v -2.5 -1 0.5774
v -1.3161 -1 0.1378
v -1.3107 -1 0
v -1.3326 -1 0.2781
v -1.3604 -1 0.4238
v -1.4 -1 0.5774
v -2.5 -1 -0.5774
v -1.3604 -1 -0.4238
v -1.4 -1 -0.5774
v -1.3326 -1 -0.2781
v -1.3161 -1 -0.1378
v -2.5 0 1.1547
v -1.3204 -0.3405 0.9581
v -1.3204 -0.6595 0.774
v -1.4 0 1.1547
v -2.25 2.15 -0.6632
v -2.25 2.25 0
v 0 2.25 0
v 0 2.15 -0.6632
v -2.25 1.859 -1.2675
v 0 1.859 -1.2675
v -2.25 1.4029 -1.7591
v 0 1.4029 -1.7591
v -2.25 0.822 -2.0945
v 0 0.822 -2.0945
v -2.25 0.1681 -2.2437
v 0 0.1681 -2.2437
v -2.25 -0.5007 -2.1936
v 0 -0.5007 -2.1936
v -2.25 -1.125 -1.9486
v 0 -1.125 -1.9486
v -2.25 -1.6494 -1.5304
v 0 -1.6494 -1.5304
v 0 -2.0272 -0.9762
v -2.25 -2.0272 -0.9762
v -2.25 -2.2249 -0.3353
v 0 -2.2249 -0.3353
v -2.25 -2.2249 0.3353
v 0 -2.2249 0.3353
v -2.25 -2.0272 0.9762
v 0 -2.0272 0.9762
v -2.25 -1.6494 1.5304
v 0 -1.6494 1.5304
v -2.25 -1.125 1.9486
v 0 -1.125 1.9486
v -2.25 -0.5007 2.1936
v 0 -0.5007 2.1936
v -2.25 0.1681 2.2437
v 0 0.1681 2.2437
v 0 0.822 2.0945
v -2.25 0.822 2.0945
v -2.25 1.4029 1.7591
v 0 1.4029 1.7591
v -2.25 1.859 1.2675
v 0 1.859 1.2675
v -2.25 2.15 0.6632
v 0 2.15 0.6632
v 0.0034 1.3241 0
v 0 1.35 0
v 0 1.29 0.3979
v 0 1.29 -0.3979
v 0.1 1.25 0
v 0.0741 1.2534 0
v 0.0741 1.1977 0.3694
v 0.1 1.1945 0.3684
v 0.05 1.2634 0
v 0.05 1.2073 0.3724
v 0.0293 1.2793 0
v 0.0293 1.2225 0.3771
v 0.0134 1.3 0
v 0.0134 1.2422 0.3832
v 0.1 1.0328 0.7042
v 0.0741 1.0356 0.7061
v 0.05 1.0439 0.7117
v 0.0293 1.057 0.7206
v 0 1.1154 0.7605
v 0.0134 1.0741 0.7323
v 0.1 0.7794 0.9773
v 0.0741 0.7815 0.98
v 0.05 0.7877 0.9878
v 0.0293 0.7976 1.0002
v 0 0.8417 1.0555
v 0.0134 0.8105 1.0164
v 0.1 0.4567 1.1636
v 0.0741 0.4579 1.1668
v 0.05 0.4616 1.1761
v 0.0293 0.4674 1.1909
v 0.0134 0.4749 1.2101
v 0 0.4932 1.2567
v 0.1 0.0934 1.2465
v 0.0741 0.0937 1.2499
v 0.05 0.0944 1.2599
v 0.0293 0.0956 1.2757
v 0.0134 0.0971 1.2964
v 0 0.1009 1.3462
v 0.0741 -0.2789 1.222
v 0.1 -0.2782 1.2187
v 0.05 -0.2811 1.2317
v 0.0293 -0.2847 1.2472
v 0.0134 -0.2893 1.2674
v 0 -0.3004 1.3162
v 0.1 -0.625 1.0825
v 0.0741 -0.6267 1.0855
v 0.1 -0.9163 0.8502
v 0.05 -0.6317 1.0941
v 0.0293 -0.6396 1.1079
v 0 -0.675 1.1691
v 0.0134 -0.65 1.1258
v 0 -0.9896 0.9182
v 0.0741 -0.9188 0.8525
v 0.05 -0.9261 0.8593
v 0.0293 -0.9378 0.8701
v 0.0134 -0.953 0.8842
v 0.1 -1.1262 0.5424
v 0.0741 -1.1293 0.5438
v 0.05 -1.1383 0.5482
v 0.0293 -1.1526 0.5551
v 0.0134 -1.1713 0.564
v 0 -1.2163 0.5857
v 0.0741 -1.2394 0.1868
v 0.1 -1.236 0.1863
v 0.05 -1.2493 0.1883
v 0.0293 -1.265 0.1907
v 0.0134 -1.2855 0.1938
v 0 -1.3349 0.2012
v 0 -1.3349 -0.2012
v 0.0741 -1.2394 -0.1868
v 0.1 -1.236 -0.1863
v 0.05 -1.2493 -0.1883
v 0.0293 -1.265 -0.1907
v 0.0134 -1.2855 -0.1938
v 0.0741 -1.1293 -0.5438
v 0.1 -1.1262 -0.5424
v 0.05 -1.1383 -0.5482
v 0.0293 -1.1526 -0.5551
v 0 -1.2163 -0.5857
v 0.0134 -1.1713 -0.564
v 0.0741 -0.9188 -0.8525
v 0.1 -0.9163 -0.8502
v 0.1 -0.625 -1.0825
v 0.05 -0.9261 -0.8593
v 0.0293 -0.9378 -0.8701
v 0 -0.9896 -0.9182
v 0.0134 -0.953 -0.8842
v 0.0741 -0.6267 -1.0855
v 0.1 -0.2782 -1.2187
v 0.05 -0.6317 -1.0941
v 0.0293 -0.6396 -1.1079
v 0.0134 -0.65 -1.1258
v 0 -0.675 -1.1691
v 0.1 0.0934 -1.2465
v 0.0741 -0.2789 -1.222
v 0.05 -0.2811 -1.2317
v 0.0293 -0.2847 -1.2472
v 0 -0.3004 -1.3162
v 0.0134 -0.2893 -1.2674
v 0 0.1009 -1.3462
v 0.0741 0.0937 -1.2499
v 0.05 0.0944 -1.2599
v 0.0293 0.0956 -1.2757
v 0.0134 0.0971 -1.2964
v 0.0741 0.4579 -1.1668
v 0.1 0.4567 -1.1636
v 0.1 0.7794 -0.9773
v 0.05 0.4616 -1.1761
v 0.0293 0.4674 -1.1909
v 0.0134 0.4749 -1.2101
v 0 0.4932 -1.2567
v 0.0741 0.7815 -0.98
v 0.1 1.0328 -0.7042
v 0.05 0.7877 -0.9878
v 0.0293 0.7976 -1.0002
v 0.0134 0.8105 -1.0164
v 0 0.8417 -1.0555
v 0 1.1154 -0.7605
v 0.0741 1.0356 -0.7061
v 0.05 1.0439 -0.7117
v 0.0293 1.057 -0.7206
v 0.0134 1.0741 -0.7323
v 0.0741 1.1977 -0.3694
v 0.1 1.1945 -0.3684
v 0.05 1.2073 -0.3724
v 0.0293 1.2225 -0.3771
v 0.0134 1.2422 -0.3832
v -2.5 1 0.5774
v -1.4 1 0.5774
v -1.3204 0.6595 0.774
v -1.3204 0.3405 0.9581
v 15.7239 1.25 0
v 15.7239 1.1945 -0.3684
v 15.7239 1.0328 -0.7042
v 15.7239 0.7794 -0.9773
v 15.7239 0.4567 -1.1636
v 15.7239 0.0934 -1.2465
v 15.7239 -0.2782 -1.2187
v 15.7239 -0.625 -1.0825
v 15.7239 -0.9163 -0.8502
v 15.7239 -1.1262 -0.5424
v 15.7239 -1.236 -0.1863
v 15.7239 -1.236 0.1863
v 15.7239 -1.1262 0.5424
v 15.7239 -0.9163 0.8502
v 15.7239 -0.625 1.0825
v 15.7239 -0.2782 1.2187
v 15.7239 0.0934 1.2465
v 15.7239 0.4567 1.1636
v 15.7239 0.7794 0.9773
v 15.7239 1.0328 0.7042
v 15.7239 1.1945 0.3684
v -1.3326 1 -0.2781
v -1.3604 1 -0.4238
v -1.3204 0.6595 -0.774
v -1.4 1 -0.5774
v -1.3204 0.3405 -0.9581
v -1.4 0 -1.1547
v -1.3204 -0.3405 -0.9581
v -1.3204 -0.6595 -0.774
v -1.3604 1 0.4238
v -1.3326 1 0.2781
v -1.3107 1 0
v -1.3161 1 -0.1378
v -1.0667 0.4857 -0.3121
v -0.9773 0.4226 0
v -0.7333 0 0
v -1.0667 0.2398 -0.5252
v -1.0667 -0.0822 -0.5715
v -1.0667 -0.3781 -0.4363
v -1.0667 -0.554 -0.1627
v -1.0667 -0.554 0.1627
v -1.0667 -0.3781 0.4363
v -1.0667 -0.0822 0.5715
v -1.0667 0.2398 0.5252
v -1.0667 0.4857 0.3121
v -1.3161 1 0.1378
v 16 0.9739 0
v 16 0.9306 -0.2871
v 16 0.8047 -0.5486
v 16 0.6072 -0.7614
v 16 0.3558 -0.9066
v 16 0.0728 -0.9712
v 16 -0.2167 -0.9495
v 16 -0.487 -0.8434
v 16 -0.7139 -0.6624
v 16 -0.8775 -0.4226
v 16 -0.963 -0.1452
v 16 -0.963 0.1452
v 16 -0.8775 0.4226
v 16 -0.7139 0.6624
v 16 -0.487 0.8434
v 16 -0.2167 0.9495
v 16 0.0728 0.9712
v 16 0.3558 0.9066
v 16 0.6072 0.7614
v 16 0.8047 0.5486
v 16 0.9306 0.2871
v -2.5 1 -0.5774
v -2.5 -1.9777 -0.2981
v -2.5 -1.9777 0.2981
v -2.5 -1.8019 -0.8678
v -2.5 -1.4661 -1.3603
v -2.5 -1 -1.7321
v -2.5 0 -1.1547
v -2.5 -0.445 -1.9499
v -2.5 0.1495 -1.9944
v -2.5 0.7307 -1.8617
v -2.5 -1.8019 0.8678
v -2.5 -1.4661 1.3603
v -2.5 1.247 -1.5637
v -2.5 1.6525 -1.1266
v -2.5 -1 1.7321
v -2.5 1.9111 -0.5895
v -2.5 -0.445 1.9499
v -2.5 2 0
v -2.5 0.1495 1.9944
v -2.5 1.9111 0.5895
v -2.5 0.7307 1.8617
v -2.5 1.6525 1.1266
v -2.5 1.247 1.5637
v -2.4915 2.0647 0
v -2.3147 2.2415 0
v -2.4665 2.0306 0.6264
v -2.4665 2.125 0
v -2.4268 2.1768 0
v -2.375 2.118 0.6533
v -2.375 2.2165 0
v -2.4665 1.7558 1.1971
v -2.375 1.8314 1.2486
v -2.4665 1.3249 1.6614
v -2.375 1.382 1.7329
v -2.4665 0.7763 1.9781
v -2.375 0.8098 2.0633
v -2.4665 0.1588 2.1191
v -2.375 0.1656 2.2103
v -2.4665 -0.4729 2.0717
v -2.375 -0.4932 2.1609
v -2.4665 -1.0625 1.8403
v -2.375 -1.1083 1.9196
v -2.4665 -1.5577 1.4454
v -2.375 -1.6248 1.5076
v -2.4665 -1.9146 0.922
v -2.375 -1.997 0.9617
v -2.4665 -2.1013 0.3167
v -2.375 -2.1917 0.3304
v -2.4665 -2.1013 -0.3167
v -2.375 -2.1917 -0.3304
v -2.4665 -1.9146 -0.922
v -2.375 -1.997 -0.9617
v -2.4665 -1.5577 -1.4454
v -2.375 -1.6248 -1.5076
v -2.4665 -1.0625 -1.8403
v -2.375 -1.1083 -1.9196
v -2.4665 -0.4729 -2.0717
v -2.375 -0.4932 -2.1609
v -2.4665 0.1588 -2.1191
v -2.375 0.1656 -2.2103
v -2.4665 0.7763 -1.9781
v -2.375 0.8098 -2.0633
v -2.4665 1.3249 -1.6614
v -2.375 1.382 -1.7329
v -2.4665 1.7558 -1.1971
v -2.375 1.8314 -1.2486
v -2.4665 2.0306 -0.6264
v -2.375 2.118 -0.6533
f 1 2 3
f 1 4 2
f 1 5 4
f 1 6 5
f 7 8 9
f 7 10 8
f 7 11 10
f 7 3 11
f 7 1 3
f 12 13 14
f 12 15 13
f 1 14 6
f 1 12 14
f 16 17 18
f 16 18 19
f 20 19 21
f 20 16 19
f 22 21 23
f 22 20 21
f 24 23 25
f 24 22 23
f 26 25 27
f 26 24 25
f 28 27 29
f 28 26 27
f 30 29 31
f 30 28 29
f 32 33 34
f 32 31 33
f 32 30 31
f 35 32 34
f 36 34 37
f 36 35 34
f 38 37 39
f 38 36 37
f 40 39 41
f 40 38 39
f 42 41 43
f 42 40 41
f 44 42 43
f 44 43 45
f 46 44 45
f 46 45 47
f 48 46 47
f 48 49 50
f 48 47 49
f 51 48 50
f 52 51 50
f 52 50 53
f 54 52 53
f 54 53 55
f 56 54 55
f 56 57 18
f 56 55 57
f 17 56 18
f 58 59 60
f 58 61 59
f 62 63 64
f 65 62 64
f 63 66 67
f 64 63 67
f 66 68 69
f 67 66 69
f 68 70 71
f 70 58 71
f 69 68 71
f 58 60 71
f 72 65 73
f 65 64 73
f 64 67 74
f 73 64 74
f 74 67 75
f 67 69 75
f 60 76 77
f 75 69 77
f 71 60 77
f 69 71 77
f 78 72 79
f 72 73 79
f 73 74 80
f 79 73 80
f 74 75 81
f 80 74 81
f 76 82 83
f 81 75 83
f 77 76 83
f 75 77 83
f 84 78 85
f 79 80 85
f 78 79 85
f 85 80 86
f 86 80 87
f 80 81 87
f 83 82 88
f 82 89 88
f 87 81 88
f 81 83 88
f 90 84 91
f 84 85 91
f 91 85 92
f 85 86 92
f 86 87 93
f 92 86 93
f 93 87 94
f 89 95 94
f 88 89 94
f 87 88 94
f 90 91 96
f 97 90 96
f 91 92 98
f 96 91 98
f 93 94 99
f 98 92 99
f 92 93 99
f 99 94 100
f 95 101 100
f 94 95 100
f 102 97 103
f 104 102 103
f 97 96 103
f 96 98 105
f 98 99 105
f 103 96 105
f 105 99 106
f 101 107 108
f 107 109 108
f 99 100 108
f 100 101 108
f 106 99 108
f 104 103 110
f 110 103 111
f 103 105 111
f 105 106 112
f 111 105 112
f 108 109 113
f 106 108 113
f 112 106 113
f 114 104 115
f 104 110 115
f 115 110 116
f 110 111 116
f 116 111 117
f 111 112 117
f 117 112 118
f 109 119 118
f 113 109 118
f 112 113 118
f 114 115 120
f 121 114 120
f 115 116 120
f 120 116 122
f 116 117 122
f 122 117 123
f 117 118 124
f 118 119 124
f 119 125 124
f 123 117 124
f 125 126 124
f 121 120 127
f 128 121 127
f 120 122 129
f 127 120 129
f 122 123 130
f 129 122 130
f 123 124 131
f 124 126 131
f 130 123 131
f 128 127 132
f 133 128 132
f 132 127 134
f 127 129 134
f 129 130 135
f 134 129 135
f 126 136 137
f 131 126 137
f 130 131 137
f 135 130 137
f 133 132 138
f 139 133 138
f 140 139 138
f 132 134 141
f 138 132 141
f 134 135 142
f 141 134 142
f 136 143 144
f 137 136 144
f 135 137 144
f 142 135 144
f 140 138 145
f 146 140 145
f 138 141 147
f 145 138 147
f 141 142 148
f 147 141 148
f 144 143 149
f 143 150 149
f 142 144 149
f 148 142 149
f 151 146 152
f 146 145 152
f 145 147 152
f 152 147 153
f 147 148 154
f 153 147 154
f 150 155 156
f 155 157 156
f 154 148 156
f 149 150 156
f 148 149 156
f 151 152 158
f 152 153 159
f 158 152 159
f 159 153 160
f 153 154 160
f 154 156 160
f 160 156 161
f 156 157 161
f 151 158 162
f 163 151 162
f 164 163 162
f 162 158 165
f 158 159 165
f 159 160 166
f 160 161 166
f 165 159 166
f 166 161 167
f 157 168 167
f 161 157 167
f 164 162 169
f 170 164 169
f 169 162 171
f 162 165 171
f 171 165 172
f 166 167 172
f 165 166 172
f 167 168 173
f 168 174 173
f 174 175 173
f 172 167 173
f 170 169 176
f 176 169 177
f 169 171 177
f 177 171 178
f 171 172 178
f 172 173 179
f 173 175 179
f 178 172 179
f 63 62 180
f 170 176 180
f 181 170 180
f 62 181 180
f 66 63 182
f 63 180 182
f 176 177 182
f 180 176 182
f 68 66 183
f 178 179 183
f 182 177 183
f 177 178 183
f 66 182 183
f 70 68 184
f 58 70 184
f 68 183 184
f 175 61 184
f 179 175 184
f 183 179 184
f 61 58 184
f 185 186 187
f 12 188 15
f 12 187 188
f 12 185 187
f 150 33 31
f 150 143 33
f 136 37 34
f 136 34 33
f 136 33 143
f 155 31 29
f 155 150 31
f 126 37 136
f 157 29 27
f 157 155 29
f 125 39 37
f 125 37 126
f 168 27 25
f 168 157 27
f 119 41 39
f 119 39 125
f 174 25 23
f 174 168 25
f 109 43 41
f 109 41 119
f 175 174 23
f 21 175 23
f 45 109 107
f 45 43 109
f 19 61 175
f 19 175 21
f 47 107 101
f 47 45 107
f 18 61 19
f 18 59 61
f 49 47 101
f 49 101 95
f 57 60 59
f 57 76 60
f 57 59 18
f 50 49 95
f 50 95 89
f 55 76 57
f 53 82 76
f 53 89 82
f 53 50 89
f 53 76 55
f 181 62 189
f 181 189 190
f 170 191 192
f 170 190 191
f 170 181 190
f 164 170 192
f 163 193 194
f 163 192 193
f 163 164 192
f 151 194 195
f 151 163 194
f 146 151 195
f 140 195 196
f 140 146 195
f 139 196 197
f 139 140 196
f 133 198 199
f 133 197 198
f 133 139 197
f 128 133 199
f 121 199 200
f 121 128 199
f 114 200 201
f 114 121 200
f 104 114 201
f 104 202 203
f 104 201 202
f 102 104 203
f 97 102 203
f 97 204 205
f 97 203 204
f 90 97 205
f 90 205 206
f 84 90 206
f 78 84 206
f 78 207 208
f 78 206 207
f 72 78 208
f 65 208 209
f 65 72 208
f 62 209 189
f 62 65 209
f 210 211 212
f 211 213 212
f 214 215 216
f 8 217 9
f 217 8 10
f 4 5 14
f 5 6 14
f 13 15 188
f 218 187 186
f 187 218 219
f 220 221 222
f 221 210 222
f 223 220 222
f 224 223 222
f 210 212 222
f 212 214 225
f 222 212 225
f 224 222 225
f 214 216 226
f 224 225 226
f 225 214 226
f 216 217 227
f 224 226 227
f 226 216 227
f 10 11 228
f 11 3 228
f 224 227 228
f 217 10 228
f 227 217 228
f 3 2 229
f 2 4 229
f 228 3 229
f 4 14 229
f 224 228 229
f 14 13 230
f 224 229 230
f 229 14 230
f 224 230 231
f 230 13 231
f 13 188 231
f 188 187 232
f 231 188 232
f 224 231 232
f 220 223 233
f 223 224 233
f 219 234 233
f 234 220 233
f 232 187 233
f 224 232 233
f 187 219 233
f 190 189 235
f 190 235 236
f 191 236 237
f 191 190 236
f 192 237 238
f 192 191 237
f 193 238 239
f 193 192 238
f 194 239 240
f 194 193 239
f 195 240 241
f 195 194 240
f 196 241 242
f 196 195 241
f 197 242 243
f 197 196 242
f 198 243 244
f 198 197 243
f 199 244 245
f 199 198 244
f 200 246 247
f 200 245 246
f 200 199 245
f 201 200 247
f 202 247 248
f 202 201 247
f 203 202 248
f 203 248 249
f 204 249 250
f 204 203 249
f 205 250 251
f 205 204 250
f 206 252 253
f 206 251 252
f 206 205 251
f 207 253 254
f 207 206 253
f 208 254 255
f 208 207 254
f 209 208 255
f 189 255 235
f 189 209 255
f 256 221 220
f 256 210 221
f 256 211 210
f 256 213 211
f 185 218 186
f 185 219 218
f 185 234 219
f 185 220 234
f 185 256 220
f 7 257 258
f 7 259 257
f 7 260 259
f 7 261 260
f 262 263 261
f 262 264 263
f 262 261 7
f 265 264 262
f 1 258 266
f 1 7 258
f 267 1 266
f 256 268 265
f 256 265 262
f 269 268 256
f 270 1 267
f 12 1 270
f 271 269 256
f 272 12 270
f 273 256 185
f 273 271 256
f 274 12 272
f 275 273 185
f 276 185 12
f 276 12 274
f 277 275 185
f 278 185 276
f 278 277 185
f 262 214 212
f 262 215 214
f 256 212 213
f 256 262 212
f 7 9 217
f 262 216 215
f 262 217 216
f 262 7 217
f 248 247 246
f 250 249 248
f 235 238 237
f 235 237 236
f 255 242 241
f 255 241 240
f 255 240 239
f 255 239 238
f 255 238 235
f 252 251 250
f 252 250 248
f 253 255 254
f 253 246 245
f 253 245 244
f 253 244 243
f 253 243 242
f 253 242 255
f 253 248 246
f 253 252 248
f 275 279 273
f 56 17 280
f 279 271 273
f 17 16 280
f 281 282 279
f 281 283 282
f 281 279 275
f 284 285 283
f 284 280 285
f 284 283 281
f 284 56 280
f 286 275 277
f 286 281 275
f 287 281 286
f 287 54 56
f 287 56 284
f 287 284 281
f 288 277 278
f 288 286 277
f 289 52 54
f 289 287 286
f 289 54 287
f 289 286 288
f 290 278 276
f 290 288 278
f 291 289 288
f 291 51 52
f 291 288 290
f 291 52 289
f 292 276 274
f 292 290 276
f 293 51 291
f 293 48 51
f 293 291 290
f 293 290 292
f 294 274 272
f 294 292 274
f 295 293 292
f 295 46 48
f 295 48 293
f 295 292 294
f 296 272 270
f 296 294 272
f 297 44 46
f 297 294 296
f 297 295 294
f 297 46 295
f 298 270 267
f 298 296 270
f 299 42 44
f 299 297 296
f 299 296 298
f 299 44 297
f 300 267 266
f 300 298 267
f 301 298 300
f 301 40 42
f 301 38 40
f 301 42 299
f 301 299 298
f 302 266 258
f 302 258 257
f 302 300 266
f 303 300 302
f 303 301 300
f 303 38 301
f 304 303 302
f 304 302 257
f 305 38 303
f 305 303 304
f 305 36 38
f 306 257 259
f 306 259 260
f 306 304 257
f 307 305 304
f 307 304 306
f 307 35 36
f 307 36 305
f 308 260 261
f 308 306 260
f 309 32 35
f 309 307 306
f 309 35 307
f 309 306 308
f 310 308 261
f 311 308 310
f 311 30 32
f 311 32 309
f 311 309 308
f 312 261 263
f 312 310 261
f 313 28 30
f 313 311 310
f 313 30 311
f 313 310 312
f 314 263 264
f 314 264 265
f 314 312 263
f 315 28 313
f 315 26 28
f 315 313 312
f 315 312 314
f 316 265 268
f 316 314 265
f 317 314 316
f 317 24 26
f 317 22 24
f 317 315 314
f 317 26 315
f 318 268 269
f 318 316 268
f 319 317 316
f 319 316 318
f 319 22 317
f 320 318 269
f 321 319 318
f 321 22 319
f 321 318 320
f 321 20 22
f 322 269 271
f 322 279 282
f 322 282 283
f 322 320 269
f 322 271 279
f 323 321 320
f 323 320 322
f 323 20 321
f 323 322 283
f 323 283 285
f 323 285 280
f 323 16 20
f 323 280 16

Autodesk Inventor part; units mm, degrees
ref_plane "YZ Plane" through (0, 0, 0) normal (1, 0, 0) x (0, 1, 0)
ref_plane "XZ Plane" through (0, 0, 0) normal (0, 1, 0) x (-1, 0, 0)
sketch "Эскиз1" plane through (0, 0, 0) normal (0, 0, 1) x (1, 0, 0)
  line L0 (-0.7333, 0) -> (16, 0)
  line L1 (16, 0) -> (16, 1.25)
  line L2 (16, 1.25) -> (1.35, 1.25)
  line L3 (1.35, 1.25) -> (1.0738, 1.25)
  line L4 (1.0738, 1.25) -> (0, 1.25)
  line L5 (0, 1.25) -> (0, 2.25)
  line L6 (0, 2.25) -> (-2.5, 2.25)
  line L7 (-2.5, 2.25) -> (-2.5, 1.1547)
  line L8 (-2.5, 1.1547) -> (-1.4, 1.1547)
  line L9 (-1.4, 1.1547) -> (-0.7333, 0)
  line L10 (-6.2, 0) -> (19.7, 0) projected
  line L11 (0, -0.45) -> (0, 2.7) projected
  line L12 (1.35, 1.25) -> (0, 1.25) construction
  dimension "d1" = 14.65
  dimension "d2" = 0.2762
  dimension "d3" = 2.5
  dimension "d4" = 1.1
  dimension "d5" = 60
  dimension "d6" = 2.5
  dimension "d7" = 2.5
  dimension "d8" = 2.3094
  dimension "d9" = 4.5
  dimension "d26" = 16
revolve "Базовый элемент" add sketch "Эскиз1" angle 360 about axis through (-0.7333, 0, 0) along (1, 0, 0)
sketch "Эскиз2" plane through (-2.5, 0, 0) normal (-1, 0, 0) x (0, 0, 1)
  circle A0 centre (0, 0) radius 1.1547 projected
  line L0 (0, -3.15) -> (0, 3.15) projected
  line L1 (-3.15, 0) -> (3.15, 0) projected
  line L2 (1.1547, 0) -> (0.5774, -1)
  line L3 (0.5774, -1) -> (-0.5774, -1)
  line L4 (-0.5774, -1) -> (-1.1547, 0)
  line L5 (-1.1547, 0) -> (-0.5774, 1)
  line L6 (-0.5774, 1) -> (0.5774, 1)
  line L7 (0.5774, 1) -> (1.1547, 0)
extrude "Паз" add sketch "Эскиз2" against normal up to next contours L7 A0 | A0 L2 | L6 L0 A0 | A0 L0 L3 | L0 L6 A0 | A0 L3 L0 | L4 A0 | A0 L5
fillet "Сопряжение1" radius 0.25 1 edges at (-2.5, -2.25, 0)
thread "Резьба" size "M2.5x0.45" class "6g" standard "ISO Metric profile" length 14.65
chamfer "Фаска1" distance 0.2761 distance2 0.2761 1 edges at (16, -1.25, 0) measured on face at (16, -0.3871, -0.3429)
ref_plane "Work Plane1" through (29, 0, 0) normal (0, -1, 0) x (1, 0, 0)
fillet "Fillet2" radius 0.1 1 edges at (0, -1.25, 0)
equation "\"d1\" = GEL"
equation "\"d3\" = KOH"
equation "\"d4\" = INTI"
equation "\"d6\" = GD"
equation "\"d7\" = BDM"
equation "\"d8\" = 1.1547 * SW"
equation "\"d9\" = KOD"
equation "\"d26\" = NLG"
equation "\"d30\" = R"
equation "\"d17\" = RR"
equation "\"d13\" = GEL"
equation "\"d15\" = -0.5 * SPD + 0.5 * GD"
equation "\"d16\" = GUL"
equation "\"GD\" = 2.5"
equation "\"NLG\" = 16"
equation "\"GEL\" = 14.65"
equation "\"KOD\" = 4.5"
equation "\"KOH\" = 2.5"
equation "\"INTI\" = 1.1"
equation "\"GAL\" = 0.61345 * PTC"
equation "\"GUL\" = 0.61345 * PTC"
equation "\"BDM\" = NND"
equation "\"SW\" = 2"
equation "\"RR\" = 0.25"
equation "\"SPD\" = NND - 1.2269 * PTC"
equation "\"R\" = 0.1"
equation "\"TOA\" = 30deg"
equation "\"GD1\" = THREADDIA - 1.2269 * PTC"
equation "\"THREADDIA\" = 2.5"
equation "\"FAWI\" = 45deg"
equation "\"PTC\" = 0.45"
equation "\"NND\" = 2.5"
equation "\"E0\" = 1.155 * SW"
properties part number "ISO 4762  - M2,5 x 16" material "Сталь нержавеющая, 440C"
